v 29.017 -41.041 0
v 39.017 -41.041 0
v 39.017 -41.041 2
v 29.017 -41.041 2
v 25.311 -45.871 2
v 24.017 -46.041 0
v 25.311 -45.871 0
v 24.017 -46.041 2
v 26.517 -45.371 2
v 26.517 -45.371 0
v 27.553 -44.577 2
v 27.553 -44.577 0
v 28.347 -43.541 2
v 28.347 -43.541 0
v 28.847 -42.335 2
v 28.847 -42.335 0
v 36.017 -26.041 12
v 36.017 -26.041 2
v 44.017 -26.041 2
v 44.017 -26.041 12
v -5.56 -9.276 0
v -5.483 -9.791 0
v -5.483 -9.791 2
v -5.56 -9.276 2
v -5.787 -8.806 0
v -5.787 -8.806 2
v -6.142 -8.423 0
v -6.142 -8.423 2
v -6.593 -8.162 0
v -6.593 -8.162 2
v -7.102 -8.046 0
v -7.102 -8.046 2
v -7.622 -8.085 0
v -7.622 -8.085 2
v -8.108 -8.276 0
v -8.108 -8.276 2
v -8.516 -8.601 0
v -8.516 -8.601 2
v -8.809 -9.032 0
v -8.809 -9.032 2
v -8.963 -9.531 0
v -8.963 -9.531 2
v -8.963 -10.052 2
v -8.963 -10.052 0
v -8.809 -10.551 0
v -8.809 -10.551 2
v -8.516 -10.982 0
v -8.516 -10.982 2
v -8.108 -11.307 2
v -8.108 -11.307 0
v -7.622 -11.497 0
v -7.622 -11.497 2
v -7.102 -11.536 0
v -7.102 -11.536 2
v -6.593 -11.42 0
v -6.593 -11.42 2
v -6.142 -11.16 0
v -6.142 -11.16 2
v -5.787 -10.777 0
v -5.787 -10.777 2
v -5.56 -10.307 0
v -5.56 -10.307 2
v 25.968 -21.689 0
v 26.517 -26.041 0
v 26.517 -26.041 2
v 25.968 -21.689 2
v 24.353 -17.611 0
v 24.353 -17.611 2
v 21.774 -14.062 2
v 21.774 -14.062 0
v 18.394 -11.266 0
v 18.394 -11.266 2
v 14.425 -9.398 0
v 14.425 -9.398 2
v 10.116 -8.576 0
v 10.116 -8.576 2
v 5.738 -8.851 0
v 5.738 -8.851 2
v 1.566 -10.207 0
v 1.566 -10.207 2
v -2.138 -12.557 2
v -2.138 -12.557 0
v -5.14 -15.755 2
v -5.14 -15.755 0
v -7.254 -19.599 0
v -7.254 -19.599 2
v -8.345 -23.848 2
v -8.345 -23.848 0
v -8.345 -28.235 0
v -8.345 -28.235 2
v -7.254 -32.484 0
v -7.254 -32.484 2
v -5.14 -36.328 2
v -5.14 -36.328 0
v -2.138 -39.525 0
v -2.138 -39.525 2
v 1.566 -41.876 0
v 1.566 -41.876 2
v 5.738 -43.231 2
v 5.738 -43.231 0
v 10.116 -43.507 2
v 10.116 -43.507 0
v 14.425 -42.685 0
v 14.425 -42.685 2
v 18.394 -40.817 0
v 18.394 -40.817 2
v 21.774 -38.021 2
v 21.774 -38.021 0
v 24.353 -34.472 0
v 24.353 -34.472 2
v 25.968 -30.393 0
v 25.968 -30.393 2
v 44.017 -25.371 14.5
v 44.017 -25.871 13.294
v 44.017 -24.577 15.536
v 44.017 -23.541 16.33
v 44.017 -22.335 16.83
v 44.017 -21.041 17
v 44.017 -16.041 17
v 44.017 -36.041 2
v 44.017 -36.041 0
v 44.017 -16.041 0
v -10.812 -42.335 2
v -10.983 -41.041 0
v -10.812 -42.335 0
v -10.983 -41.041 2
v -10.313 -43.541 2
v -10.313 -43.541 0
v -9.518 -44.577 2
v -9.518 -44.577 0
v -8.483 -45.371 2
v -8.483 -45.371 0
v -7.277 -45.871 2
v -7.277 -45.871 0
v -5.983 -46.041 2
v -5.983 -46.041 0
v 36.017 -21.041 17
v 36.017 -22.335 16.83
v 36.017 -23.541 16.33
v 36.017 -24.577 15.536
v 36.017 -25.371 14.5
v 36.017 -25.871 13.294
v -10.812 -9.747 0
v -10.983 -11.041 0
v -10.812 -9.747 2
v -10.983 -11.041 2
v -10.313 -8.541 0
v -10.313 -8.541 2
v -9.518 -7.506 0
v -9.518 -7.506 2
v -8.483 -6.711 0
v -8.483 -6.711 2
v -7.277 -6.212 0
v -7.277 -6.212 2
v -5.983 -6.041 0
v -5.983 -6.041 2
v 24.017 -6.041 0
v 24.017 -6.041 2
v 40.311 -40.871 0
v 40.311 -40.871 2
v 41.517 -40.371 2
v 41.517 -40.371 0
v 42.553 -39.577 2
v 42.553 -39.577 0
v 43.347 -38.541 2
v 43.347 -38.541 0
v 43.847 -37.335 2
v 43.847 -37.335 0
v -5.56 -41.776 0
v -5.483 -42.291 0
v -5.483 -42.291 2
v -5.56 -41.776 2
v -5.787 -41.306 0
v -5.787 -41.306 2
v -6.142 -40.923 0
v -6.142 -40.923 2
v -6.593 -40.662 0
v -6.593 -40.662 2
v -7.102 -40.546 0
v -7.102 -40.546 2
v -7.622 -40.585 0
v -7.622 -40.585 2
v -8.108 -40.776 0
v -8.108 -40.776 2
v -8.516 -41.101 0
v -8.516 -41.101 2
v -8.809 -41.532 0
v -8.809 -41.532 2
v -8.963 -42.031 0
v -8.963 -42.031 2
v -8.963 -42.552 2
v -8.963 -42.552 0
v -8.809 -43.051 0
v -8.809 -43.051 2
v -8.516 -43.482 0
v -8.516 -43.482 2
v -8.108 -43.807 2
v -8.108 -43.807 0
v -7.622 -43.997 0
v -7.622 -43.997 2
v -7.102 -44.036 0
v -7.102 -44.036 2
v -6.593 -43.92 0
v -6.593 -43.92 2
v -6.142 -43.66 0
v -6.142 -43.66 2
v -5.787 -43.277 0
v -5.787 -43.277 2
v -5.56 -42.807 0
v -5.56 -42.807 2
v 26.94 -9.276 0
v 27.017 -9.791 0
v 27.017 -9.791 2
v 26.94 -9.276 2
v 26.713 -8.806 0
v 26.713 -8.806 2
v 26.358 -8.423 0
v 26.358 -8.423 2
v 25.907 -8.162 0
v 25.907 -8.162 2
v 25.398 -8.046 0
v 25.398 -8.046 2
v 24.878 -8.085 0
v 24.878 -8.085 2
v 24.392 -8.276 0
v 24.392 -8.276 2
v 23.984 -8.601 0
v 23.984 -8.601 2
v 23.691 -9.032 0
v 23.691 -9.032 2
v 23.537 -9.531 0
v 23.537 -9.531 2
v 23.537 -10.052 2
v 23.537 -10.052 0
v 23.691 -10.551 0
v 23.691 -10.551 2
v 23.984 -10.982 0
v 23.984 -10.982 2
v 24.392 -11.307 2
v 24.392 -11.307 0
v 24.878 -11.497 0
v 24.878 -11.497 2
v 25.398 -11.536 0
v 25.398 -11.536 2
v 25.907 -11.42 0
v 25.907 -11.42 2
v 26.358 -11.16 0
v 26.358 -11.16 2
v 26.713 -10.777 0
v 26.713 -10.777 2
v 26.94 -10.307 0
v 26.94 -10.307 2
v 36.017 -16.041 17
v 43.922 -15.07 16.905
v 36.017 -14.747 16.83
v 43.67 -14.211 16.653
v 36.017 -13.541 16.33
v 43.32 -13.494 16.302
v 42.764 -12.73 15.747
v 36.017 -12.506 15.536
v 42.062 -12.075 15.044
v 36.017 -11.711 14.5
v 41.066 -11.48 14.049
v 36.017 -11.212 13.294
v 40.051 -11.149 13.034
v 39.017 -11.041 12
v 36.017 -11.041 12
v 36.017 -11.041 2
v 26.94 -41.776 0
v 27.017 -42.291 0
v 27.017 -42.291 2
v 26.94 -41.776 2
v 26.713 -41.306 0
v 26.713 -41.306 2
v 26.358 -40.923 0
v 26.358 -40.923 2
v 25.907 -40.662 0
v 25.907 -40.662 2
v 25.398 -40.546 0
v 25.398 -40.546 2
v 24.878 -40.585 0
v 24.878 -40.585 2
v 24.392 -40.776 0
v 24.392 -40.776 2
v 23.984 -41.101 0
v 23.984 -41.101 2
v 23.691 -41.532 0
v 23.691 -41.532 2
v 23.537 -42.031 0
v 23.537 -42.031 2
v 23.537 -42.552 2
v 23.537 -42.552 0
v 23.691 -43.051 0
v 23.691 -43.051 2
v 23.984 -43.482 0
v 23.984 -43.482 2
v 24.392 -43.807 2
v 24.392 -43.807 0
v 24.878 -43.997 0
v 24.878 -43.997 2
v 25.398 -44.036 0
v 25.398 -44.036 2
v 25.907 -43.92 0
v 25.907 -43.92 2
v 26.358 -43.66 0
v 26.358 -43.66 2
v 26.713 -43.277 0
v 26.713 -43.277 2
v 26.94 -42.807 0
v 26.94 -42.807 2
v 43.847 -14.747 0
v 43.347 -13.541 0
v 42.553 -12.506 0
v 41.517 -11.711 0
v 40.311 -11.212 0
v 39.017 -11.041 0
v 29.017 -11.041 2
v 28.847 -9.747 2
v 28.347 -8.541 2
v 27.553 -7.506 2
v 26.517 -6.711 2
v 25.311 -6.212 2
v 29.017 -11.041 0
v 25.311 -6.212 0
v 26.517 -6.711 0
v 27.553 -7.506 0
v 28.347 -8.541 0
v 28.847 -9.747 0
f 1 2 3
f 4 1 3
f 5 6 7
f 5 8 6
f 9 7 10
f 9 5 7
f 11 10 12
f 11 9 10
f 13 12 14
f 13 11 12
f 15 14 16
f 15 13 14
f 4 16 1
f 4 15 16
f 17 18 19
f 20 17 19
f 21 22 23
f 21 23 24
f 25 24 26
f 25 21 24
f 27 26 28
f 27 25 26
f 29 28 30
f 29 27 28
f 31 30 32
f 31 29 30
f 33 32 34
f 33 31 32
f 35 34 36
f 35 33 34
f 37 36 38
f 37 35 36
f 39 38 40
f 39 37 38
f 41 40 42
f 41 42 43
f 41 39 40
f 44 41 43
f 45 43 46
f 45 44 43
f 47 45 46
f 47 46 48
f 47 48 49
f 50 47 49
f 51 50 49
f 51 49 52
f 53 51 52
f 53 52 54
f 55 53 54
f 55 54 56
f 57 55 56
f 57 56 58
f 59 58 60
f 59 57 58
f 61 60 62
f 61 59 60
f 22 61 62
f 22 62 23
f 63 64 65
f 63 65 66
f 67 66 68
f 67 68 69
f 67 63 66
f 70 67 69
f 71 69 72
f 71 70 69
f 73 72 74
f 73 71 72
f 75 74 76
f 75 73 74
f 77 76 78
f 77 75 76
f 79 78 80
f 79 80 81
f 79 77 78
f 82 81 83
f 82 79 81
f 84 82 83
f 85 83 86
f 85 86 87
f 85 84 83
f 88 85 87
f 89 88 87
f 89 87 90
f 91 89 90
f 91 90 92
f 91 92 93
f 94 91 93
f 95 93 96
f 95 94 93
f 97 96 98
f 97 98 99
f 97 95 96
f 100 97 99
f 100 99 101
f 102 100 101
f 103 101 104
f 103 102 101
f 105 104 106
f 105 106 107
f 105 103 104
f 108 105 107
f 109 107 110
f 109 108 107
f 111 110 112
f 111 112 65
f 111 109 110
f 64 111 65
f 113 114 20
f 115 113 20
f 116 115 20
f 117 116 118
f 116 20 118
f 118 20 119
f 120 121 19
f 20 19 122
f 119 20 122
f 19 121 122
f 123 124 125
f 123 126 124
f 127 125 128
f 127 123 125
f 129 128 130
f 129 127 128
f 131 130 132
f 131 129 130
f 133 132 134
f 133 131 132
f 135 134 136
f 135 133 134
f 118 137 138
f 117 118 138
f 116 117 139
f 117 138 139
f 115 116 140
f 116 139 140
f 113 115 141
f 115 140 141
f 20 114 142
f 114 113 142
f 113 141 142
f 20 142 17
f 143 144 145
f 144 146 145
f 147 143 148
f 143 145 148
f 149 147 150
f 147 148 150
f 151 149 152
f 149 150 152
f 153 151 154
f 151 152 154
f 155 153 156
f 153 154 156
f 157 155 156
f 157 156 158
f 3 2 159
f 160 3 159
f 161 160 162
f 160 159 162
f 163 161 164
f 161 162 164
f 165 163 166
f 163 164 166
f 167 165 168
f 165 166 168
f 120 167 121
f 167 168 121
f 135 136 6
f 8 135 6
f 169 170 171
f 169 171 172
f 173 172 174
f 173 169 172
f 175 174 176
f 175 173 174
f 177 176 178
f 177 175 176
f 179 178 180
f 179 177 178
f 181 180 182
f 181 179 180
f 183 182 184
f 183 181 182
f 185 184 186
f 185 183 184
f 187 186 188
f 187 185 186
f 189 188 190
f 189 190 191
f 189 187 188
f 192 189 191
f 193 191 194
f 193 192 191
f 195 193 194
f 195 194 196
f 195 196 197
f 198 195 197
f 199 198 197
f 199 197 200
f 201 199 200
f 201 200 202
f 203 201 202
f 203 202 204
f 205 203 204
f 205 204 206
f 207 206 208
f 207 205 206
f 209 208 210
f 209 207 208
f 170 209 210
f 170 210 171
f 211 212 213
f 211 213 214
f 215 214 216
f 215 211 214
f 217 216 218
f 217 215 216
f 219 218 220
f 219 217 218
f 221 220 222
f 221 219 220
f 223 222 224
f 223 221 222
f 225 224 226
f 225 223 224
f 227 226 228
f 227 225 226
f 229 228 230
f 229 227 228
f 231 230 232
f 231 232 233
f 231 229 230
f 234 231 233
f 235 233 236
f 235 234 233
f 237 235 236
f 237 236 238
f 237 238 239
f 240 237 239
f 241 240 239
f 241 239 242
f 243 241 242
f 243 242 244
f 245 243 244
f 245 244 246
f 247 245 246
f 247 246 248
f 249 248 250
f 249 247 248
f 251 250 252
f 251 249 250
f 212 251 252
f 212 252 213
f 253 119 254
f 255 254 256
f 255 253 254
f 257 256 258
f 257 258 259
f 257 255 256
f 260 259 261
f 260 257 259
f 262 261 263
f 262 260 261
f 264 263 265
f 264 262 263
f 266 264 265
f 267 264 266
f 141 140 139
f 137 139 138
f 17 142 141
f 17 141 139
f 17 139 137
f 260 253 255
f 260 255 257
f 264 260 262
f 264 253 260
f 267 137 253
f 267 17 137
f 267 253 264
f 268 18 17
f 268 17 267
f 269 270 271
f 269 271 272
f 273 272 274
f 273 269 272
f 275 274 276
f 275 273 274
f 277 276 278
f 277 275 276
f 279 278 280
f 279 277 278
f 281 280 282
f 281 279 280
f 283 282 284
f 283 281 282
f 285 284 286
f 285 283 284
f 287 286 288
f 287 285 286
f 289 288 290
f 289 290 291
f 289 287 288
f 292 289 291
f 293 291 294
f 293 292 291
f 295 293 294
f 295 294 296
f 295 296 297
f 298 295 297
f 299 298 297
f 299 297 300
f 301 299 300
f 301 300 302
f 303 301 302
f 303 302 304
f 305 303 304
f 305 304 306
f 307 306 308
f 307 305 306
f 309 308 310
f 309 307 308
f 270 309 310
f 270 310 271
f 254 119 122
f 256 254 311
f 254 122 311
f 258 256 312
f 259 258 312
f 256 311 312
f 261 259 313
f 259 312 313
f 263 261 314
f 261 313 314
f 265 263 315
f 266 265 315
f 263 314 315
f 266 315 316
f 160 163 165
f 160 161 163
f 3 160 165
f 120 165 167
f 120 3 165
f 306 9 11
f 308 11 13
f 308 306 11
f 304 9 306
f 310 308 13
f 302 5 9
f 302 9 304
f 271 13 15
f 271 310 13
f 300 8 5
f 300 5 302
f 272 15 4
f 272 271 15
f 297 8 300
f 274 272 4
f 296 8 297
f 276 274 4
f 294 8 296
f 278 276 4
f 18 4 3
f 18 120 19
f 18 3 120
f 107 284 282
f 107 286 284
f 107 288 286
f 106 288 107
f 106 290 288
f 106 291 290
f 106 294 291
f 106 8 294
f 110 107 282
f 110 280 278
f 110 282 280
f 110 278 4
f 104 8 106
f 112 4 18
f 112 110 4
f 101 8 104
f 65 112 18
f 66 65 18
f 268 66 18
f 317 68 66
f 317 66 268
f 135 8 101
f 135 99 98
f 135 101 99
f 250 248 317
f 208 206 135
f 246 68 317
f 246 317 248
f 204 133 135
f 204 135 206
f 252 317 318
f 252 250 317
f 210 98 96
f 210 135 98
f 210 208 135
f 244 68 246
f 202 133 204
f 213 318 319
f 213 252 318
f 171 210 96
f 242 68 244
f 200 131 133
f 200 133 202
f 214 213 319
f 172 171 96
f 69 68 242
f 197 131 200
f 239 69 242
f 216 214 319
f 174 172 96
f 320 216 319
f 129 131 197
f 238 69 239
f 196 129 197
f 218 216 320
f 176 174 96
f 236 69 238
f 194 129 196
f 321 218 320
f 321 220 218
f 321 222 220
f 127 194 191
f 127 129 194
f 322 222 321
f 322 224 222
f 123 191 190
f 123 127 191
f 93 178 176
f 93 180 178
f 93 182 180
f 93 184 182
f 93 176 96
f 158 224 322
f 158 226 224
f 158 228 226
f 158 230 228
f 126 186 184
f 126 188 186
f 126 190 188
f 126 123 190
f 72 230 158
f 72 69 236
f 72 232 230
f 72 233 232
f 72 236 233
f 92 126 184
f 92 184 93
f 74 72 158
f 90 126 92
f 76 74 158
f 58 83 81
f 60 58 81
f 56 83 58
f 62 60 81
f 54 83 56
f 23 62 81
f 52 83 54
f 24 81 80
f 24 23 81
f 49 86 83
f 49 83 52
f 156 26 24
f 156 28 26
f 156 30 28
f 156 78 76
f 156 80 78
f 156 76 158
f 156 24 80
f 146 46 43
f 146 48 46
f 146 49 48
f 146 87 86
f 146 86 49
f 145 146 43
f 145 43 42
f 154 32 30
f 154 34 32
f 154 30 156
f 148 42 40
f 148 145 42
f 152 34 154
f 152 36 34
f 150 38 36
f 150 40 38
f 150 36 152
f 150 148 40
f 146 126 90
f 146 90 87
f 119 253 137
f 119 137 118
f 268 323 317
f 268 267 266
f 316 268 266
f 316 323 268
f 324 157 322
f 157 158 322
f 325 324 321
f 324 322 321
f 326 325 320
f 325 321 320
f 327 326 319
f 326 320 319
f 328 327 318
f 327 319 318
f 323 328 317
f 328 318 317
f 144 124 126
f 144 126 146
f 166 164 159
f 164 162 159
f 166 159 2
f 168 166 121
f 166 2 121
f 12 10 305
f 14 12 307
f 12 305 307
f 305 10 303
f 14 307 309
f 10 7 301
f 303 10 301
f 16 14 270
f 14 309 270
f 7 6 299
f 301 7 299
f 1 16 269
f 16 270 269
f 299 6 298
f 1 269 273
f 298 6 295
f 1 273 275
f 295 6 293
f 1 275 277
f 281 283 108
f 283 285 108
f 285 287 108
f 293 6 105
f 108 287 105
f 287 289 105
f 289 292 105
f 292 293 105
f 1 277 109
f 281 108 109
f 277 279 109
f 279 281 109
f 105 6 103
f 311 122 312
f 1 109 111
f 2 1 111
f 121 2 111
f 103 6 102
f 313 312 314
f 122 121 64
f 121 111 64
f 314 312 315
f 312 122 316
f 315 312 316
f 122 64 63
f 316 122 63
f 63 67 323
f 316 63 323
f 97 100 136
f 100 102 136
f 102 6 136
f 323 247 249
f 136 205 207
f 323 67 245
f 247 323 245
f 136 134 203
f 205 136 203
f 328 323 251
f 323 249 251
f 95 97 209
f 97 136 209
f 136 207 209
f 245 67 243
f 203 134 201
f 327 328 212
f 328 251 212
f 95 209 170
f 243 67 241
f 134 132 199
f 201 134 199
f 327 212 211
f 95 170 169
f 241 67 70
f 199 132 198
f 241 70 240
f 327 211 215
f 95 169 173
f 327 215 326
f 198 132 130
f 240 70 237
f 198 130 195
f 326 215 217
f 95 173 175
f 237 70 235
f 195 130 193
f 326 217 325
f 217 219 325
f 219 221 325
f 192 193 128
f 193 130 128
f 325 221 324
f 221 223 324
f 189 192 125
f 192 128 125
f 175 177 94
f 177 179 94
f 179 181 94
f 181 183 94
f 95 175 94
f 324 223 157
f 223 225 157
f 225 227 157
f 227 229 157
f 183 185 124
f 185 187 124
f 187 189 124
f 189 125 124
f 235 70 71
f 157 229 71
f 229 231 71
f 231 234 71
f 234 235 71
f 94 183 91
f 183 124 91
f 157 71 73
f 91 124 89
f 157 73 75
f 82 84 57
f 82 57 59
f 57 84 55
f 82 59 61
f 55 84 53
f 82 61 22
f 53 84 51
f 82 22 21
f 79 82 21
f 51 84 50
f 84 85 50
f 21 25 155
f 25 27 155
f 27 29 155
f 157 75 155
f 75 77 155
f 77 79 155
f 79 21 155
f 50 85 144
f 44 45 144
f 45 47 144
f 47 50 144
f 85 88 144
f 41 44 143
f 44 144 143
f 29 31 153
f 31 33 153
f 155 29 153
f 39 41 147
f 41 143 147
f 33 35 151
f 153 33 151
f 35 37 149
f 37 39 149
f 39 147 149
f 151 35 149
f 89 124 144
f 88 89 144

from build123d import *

# Parameters (mm, degrees)
F0_W        = 40
F0_H        = 40
F0_R        = 1.75
F0_R_2      = 17.5
F1_DEPTH    = 2
F2_R        = 5
F3_DEPTH    = 15
F4_W        = 8
F4_H        = 15
F5_DEPTH    = 15
F6_T1_DEPTH = 33
F6_T3_DEPTH = 42
F6_T5_DEPTH = 27


# Not quite as in the source:
# - a fillet or chamfer that OpenCascade refuses, or shapes differently, is made with other operations: its cross-section is extruded or revolved along the edge and cut away or added


with BuildPart() as f1:
    # F0 (on Top) → F1 (new body)
    with BuildSketch(Plane.XY):
        with Locations((9.0173190544, -26.0413483679)):
            Rectangle(F0_W, F0_H)
        with Locations((-7.2326809456, -42.2913483679)):
            Circle(F0_R, mode=Mode.SUBTRACT)
        with Locations((25.2673190544, -42.2913483679)):
            Circle(F0_R, mode=Mode.SUBTRACT)
        with Locations((9.0173190544, -26.0413483679)):
            Circle(F0_R_2, mode=Mode.SUBTRACT)
        with Locations((-7.2326809456, -9.7913483679)):
            Circle(F0_R, mode=Mode.SUBTRACT)
        with Locations((25.2673190544, -9.7913483679)):
            Circle(F0_R, mode=Mode.SUBTRACT)
    extrude(amount=F1_DEPTH)

    # F2
    f2_edges = [f1.edges().sort_by_distance(p)[0] for p in [
        (29.017319, -46.041348, 1),
        (29.017319, -6.041348, 1),
        (-10.982681, -46.041348, 1),
        (-10.982681, -6.041348, 1),
    ]]
    fillet(f2_edges, radius=F2_R)

    # F3 (add): a face of the model
    f3_faces = [f1.faces().sort_by_distance(p)[0] for p in [
        (29.0173190544, -26.0413483679, 1),
    ]]
    extrude(f3_faces, amount=F3_DEPTH)

    # F4 (on face) → F5 (join)
    with BuildSketch(Plane.XY.offset(2)):
        with Locations((40.0173190544, -18.5413483679)):
            Rectangle(F4_W, F4_H)
    extrude(amount=F5_DEPTH)

    # F6: fillet of radius 5 on 5 edges, made by hand

    # F6_s2 → F6_t1 (cut)
    with BuildSketch(Plane.YZ.offset(23.5173190544)):
        with BuildLine():
            ThreePointArc((-21.0413483679, 17), (-24.5768822739, 15.5355339059), (-26.0413483679, 12))
            Line((-26.0413483679, 12), (-26.0413483679, 17))
            Line((-26.0413483679, 17), (-21.0413483679, 17))
        make_face()
        with BuildLine():
            ThreePointArc((-16.0413483679, 17), (-12.505814462, 15.5355339059), (-11.0413483679, 12))
            Line((-11.0413483679, 12), (-11.0413483679, 17))
            Line((-11.0413483679, 17), (-16.0413483679, 17))
        make_face()
    extrude(amount=F6_T1_DEPTH, mode=Mode.SUBTRACT)

    # F6_s4 → F6_t3 (cut)
    with BuildSketch(Plane.XY.offset(-12.5)):
        with BuildLine():
            ThreePointArc((44.0173190544, -16.0413483679), (42.5528529604, -12.505814462), (39.0173190544, -11.0413483679))
            Line((39.0173190544, -11.0413483679), (44.0173190544, -11.0413483679))
            Line((44.0173190544, -11.0413483679), (44.0173190544, -16.0413483679))
        make_face()
    extrude(amount=F6_T3_DEPTH, mode=Mode.SUBTRACT)

    # F6_s6 → F6_t5 (cut)
    with BuildSketch(Plane.XY.offset(-12.5)):
        with BuildLine():
            ThreePointArc((39.0173190544, -41.0413483679), (42.5528529604, -39.5768822739), (44.0173190544, -36.0413483679))
            Line((44.0173190544, -36.0413483679), (44.0173190544, -41.0413483679))
            Line((44.0173190544, -41.0413483679), (39.0173190544, -41.0413483679))
        make_face()
    extrude(amount=F6_T5_DEPTH, mode=Mode.SUBTRACT)


solid = f1.part
